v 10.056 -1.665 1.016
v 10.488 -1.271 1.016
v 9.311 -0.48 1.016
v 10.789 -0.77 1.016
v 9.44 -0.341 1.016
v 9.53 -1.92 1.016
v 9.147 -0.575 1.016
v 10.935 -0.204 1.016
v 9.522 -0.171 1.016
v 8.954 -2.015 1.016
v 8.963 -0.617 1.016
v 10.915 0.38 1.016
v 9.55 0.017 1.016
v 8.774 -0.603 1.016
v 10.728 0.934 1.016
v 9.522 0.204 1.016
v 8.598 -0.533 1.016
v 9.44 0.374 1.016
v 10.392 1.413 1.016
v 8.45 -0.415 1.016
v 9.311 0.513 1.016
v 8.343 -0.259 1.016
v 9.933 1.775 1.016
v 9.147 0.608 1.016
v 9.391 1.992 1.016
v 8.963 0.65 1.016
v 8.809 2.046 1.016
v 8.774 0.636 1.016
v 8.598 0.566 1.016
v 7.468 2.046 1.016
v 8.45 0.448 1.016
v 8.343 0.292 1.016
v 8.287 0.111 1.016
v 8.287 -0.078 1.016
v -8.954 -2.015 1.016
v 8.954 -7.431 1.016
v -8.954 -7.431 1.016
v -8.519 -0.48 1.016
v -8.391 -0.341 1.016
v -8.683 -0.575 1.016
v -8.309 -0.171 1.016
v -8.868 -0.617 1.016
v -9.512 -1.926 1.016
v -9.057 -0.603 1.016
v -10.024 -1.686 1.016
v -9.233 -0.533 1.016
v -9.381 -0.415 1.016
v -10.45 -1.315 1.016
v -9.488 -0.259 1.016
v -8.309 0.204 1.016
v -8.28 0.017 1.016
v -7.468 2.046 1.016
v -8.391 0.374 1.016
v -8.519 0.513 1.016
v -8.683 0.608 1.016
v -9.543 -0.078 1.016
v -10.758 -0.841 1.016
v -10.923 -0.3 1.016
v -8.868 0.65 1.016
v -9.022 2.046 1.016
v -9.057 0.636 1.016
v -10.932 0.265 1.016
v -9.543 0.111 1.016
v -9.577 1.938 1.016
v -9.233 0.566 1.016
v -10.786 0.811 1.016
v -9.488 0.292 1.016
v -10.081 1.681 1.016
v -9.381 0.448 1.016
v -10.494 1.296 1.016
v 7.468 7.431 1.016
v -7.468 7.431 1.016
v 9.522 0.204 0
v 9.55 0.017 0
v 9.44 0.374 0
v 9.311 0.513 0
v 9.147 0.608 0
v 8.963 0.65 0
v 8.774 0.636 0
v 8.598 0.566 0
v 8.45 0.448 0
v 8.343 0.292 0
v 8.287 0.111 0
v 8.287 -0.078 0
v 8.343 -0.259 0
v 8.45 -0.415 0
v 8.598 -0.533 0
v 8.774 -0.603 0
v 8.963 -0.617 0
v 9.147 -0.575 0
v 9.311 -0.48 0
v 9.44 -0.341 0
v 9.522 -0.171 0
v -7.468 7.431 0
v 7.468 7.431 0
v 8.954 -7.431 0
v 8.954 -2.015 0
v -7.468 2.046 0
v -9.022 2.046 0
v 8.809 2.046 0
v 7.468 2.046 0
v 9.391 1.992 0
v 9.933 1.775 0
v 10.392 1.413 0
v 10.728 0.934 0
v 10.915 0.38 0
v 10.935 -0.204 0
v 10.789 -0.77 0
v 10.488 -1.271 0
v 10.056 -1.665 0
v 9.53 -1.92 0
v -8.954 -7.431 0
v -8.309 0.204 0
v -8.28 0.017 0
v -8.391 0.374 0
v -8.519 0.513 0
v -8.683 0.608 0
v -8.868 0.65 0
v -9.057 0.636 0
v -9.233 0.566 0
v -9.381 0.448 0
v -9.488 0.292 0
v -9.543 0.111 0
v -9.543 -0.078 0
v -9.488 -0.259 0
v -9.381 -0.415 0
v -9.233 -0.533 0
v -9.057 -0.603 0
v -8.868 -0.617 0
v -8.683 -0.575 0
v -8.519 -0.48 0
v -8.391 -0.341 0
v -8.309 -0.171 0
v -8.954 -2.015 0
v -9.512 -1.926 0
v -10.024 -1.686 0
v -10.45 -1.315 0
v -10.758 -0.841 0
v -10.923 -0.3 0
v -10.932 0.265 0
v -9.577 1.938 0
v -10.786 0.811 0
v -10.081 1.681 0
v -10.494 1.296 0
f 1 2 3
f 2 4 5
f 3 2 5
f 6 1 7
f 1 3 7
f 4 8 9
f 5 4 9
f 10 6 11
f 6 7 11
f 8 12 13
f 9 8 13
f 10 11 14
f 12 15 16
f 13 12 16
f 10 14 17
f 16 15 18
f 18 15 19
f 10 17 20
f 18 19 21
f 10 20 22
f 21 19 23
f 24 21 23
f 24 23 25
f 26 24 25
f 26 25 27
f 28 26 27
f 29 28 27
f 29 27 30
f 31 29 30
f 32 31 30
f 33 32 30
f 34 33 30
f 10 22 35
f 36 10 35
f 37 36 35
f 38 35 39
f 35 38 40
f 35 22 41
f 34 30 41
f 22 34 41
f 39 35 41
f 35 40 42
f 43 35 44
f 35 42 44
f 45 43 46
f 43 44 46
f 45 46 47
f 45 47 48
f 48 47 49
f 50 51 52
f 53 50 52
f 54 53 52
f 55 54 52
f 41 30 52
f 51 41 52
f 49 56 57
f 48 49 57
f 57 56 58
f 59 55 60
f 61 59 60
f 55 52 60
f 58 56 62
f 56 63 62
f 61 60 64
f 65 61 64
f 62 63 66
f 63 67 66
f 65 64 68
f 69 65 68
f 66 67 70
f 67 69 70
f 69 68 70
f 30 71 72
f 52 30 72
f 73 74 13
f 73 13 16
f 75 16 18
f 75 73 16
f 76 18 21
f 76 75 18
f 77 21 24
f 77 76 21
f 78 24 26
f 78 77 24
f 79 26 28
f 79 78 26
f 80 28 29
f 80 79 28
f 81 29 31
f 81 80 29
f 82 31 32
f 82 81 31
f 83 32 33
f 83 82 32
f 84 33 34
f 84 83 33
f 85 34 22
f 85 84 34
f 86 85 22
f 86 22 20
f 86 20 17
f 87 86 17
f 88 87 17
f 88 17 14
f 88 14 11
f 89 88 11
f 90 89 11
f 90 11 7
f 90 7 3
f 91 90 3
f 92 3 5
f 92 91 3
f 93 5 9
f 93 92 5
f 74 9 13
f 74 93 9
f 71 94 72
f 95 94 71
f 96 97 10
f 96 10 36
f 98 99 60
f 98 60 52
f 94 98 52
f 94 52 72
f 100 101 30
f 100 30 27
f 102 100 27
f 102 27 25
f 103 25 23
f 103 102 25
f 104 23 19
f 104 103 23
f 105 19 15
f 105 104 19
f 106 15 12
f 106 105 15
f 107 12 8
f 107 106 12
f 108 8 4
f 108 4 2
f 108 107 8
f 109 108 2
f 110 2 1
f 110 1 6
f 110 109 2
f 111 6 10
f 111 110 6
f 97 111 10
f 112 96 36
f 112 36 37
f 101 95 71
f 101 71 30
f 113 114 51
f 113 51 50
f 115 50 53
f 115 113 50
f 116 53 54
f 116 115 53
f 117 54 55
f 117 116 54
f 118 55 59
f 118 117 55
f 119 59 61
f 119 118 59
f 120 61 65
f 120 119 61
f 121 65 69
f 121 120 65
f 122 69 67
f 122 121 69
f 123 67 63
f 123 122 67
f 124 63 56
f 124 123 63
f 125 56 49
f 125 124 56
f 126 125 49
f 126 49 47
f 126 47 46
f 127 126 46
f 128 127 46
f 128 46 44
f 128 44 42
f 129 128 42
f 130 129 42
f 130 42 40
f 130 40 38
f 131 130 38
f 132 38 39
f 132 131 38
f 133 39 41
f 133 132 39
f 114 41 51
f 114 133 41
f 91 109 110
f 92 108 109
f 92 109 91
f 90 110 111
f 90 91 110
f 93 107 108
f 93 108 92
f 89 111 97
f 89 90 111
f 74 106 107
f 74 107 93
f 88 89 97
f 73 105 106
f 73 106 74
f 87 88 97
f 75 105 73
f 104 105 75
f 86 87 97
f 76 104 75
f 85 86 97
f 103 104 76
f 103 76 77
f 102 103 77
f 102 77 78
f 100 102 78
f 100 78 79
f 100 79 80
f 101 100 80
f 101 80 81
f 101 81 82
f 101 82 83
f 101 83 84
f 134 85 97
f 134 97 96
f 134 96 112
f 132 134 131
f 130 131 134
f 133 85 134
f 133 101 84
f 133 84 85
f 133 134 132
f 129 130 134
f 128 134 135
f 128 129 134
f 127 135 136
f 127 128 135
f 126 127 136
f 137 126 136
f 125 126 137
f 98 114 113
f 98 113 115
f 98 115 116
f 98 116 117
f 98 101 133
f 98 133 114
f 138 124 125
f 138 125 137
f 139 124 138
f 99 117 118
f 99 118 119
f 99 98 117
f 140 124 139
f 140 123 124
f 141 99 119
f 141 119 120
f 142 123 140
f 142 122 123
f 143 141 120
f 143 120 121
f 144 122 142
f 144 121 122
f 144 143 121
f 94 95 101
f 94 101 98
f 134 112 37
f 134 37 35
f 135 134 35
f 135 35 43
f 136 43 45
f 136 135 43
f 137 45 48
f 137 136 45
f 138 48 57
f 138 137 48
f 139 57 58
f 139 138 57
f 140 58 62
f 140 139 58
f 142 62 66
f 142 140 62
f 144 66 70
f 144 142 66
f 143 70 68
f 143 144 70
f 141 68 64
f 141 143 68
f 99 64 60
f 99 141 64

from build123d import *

# Parameters (mm, degrees)
SKETCH1_R           = 0.635000006
BOSS_EXTRUDE1_DEPTH = 1.016


with BuildPart() as part:
    # Sketch1 → Boss-Extrude1 (new body)
    with BuildSketch(Plane.XY):
        with BuildLine():
            Line((-7.4676, 7.430550118), (7.4676, 7.430550118))
            Line((7.4676, 7.430550118), (7.4676, 2.045750118))
            Line((7.4676, 2.045750118), (8.808625011, 2.045750118))
            ThreePointArc((8.808625011, 2.045750118), (10.946108081, 0.089005249), (8.9535, -2.015085385))
            Line((8.9535, -2.015085385), (8.9535, -7.430550118))
            Line((8.9535, -7.430550118), (-8.9535, -7.430550118))
            Line((-8.9535, -7.430550118), (-8.9535, -2.015085385))
            ThreePointArc((-8.9535, -2.015085385), (-10.947109486, -0.017801943), (-9.022174989, 2.045750118))
            Line((-9.022174989, 2.045750118), (-7.4676, 2.045750118))
            Line((-7.4676, 2.045750118), (-7.4676, 7.430550118))
        make_face()
        with Locations((-8.9154, 0.016557396)):
            Circle(SKETCH1_R, mode=Mode.SUBTRACT)
        with Locations((8.9154, 0.016557396)):
            Circle(SKETCH1_R, mode=Mode.SUBTRACT)
    extrude(amount=BOSS_EXTRUDE1_DEPTH)


solid = part.part
